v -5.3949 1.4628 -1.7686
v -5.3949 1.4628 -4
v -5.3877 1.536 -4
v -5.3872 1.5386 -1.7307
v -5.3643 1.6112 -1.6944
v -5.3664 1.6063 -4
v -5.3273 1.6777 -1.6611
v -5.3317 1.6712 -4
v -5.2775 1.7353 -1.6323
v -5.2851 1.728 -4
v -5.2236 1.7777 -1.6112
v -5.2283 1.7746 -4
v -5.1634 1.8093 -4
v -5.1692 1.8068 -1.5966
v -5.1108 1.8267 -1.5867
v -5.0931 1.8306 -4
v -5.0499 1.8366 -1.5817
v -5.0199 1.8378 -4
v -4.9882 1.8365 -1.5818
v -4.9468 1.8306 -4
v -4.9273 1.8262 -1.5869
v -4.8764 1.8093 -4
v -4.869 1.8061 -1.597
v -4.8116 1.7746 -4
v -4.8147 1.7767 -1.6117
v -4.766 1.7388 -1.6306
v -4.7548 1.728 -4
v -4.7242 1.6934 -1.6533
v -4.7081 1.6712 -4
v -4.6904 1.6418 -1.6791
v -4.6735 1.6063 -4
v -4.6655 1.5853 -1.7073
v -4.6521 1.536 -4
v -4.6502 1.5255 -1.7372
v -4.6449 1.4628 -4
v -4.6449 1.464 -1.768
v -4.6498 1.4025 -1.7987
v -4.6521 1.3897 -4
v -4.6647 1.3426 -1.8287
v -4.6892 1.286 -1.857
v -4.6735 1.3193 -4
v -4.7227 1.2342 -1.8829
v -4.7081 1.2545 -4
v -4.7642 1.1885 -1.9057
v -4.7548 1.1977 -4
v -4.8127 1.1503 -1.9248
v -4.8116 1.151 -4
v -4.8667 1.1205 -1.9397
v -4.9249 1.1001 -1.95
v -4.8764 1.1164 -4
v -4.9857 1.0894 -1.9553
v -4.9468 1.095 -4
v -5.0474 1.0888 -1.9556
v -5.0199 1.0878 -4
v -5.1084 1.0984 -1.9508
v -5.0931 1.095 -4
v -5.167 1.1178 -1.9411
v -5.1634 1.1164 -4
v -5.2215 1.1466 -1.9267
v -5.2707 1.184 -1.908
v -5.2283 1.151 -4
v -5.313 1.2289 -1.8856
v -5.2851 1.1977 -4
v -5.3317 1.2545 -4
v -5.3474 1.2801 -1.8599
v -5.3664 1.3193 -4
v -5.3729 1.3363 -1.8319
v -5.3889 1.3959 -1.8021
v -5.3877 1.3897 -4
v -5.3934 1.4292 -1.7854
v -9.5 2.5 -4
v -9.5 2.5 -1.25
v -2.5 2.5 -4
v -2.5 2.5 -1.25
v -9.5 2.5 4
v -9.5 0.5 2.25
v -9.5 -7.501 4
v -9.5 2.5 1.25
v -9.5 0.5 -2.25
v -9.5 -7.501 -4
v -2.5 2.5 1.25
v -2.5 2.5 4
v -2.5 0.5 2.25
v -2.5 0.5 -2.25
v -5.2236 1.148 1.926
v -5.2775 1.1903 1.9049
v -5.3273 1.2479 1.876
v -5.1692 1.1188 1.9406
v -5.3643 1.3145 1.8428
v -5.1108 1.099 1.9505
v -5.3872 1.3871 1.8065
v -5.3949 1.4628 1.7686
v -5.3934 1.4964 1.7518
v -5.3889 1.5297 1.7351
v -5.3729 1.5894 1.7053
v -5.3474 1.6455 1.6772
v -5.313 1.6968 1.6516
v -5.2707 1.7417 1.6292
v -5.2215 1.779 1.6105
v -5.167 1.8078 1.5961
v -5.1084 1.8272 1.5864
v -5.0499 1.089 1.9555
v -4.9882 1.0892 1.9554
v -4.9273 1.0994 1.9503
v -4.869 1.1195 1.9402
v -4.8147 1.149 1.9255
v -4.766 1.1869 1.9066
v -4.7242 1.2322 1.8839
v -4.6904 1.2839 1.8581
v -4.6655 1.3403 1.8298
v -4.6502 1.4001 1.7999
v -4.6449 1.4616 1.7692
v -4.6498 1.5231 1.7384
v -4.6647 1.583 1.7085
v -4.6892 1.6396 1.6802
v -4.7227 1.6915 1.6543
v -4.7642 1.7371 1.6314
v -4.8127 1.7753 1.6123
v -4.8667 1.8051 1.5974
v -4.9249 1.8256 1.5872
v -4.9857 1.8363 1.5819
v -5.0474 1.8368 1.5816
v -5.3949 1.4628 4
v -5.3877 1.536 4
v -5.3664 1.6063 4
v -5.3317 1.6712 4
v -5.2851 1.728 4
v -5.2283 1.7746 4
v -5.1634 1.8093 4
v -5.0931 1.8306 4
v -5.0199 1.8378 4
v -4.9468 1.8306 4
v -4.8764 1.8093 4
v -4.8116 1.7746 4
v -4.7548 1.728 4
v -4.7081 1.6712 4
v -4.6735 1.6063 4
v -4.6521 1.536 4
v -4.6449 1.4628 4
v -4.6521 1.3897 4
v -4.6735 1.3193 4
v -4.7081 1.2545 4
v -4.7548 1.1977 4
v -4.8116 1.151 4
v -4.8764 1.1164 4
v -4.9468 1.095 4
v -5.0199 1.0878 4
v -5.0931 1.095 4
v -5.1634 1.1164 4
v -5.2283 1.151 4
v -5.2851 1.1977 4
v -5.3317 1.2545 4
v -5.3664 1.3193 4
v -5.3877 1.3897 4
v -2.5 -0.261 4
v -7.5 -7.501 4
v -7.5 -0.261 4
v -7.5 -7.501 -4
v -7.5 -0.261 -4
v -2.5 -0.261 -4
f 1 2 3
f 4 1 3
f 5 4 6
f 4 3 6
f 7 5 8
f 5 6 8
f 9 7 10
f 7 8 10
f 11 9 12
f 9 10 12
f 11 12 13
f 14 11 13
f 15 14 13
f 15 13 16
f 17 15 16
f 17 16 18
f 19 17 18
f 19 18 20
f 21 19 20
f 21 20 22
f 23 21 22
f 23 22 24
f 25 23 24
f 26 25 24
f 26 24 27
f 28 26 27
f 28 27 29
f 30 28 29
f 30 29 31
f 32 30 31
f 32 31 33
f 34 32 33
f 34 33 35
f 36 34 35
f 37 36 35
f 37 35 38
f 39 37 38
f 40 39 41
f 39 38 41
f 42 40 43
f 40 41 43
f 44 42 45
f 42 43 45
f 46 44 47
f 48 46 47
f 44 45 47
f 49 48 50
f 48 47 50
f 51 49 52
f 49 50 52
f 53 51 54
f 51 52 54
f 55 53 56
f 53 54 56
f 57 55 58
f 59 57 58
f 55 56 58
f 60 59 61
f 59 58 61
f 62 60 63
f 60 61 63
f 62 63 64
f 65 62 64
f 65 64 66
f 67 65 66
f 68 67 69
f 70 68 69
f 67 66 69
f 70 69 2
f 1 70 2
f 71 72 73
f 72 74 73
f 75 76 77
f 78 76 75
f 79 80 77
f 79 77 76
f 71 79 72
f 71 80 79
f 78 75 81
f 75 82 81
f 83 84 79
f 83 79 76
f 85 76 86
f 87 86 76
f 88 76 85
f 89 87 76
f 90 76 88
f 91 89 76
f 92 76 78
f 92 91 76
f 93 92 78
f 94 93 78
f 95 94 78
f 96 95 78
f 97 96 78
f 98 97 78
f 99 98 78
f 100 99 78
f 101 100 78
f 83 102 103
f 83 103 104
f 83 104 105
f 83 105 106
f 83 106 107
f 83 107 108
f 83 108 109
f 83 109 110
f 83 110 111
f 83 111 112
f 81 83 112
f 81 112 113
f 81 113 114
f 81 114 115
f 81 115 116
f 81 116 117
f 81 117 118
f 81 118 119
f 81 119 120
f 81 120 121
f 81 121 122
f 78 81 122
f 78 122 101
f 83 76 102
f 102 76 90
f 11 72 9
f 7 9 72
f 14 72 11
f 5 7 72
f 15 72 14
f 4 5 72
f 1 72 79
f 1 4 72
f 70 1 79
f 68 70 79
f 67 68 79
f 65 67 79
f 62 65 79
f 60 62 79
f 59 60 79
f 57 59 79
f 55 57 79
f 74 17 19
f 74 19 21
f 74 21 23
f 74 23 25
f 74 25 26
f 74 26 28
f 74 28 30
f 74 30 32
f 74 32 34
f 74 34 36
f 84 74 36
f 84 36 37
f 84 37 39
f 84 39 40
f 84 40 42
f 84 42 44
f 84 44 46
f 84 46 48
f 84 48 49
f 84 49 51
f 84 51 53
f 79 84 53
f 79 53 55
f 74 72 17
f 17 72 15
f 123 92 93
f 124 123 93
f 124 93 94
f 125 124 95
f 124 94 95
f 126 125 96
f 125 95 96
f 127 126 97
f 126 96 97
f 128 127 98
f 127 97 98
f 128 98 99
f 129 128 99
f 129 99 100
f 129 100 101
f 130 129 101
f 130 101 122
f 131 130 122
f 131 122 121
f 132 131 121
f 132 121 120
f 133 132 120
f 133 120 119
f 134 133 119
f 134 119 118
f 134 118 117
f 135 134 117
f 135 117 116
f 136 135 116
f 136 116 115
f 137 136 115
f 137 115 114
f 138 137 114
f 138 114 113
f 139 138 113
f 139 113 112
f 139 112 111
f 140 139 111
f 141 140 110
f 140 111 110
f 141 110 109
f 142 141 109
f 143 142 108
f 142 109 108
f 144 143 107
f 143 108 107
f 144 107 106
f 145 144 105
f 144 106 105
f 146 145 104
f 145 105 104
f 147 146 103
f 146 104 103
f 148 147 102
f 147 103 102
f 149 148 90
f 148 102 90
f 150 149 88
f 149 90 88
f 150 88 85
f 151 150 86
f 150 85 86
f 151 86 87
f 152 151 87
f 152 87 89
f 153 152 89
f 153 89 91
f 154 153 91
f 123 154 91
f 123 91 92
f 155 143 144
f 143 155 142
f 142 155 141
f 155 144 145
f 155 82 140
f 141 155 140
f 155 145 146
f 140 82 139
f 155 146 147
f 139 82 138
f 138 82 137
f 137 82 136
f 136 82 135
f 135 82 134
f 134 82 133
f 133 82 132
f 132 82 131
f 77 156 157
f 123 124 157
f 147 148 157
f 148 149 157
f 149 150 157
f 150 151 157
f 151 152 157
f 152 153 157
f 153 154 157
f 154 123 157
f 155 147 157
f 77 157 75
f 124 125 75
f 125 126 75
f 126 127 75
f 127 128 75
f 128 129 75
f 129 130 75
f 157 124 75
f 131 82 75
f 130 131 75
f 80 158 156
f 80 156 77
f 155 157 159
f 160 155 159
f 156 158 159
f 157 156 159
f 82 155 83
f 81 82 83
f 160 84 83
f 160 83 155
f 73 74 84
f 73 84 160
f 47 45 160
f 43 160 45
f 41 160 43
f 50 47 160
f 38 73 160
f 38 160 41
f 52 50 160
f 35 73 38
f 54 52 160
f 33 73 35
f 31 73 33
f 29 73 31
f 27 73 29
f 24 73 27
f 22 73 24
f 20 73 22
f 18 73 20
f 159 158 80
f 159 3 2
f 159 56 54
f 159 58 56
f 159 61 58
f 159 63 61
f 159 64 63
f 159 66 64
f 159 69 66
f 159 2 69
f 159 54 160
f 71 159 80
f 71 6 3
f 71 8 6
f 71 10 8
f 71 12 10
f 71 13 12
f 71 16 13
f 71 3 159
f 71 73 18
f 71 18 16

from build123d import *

# Parameters (mm, degrees)
SKETCH1_W           = 19
SKETCH1_H           = 9
BOSS_EXTRUDE1_DEPTH = 4
CUT_EXTRUDE1_REACH  = 10
SKETCH2_W           = 15
SKETCH2_H           = 7
CUT_EXTRUDE3_REACH  = 10
SKETCH5_W           = 2
SKETCH5_H           = 9
BOSS_EXTRUDE2_DEPTH = 5
CUT_EXTRUDE4_REACH  = 19
SKETCH7_W           = 8
SKETCH7_H           = 2
SKETCH8_R           = 0.375
CUT_EXTRUDE6_DEPTH  = 8
SKETCH9_W           = 2
SKETCH9_H           = 7.24
BOSS_EXTRUDE3_DEPTH = 8
CUT_EXTRUDE7_REACH  = 4


with BuildPart() as part:
    # Sketch1 → Boss-Extrude1 (new body, symmetric)
    with BuildSketch(Plane.XY):
        Rectangle(SKETCH1_W, SKETCH1_H)
    extrude(amount=BOSS_EXTRUDE1_DEPTH, both=True)

    # Sketch2 → Cut-Extrude1 (cut, up to next)
    with BuildSketch(Plane.XY.offset(4), mode=Mode.PRIVATE) as cut_extrude1_sk1:
        with Locations((0, -1)):
            Rectangle(SKETCH2_W, SKETCH2_H)
    cut_extrude1_tool1 = extrude(cut_extrude1_sk1.sketch, amount=-CUT_EXTRUDE1_REACH, mode=Mode.PRIVATE) & part.part
    add(cut_extrude1_tool1.solids().sort_by_distance((0, -1, 4))[0], mode=Mode.SUBTRACT)

    # Sketch5 → Cut-Extrude3 (cut, up to next)
    with BuildSketch(Plane.XY.offset(4), mode=Mode.PRIVATE) as cut_extrude3_sk1:
        with Locations((8.5, 0)):
            Rectangle(SKETCH5_W, SKETCH5_H)
    cut_extrude3_tool1 = extrude(cut_extrude3_sk1.sketch, amount=-CUT_EXTRUDE3_REACH, mode=Mode.PRIVATE) & part.part
    add(cut_extrude3_tool1.solids().sort_by_distance((8.5, 0, 4))[0], mode=Mode.SUBTRACT)

    # Sketch6 → Boss-Extrude2 (add)
    with BuildSketch(Plane(origin=(-7.5, 0, 0), x_dir=(0, 0, -1), z_dir=(1, 0, 0))):
        Polygon((4, 2.5), (1.25, 2.5), (2, 0.999999988), (2.249999998, 0.499999988), (-2.249999998, 0.499999988), (-2, 0.999999988), (-1.25, 2.5), (-4, 2.5), (-4, -0.260952874), (4, -0.260952874), align=None)
    extrude(amount=BOSS_EXTRUDE2_DEPTH)

    # Sketch7 → Cut-Extrude4 (cut, up to next)
    with BuildSketch(Plane(origin=(7.5, 0, 0), x_dir=(0, 0, -1), z_dir=(1, 0, 0)), mode=Mode.PRIVATE) as cut_extrude4_sk1:
        with Locations((0, 3.5)):
            Rectangle(SKETCH7_W, SKETCH7_H)
    cut_extrude4_tool1 = extrude(cut_extrude4_sk1.sketch, amount=-CUT_EXTRUDE4_REACH, mode=Mode.PRIVATE) & part.part
    add(cut_extrude4_tool1.solids().sort_by_distance((7.5, 3.5, 0))[0], mode=Mode.SUBTRACT)

    # Sketch8 → Cut-Extrude6 (cut)
    with BuildSketch(Plane(origin=(0, 0, -4), x_dir=(-1, 0, 0), z_dir=(0, 0, -1))):
        with Locations((5.019927309, 1.462821702)):
            Circle(SKETCH8_R)
    extrude(amount=-CUT_EXTRUDE6_DEPTH, mode=Mode.SUBTRACT)

    # Sketch9 → Boss-Extrude3 (add)
    with BuildSketch(Plane(origin=(0, 0, -4), x_dir=(-1, 0, 0), z_dir=(0, 0, -1))):
        with Locations((8.5, -3.880952874)):
            Rectangle(SKETCH9_W, SKETCH9_H)
    extrude(amount=-BOSS_EXTRUDE3_DEPTH)

    # Sketch10 → Cut-Extrude7 (cut, up to next)
    with BuildSketch(Plane(origin=(-7.5, 0, 0), x_dir=(0, 0, -1), z_dir=(1, 0, 0)), mode=Mode.PRIVATE) as cut_extrude7_sk1:
        Polygon((-2.249999998, 0.499999988), (-1.25, 2.5), (1.25, 2.5), (2.249999998, 0.499999988), align=None)
    cut_extrude7_tool1 = extrude(cut_extrude7_sk1.sketch, amount=-CUT_EXTRUDE7_REACH, mode=Mode.PRIVATE) & part.part
    add(cut_extrude7_tool1.solids().sort_by_distance((-7.5, 1.404762, 0))[0], mode=Mode.SUBTRACT)


solid = part.part
